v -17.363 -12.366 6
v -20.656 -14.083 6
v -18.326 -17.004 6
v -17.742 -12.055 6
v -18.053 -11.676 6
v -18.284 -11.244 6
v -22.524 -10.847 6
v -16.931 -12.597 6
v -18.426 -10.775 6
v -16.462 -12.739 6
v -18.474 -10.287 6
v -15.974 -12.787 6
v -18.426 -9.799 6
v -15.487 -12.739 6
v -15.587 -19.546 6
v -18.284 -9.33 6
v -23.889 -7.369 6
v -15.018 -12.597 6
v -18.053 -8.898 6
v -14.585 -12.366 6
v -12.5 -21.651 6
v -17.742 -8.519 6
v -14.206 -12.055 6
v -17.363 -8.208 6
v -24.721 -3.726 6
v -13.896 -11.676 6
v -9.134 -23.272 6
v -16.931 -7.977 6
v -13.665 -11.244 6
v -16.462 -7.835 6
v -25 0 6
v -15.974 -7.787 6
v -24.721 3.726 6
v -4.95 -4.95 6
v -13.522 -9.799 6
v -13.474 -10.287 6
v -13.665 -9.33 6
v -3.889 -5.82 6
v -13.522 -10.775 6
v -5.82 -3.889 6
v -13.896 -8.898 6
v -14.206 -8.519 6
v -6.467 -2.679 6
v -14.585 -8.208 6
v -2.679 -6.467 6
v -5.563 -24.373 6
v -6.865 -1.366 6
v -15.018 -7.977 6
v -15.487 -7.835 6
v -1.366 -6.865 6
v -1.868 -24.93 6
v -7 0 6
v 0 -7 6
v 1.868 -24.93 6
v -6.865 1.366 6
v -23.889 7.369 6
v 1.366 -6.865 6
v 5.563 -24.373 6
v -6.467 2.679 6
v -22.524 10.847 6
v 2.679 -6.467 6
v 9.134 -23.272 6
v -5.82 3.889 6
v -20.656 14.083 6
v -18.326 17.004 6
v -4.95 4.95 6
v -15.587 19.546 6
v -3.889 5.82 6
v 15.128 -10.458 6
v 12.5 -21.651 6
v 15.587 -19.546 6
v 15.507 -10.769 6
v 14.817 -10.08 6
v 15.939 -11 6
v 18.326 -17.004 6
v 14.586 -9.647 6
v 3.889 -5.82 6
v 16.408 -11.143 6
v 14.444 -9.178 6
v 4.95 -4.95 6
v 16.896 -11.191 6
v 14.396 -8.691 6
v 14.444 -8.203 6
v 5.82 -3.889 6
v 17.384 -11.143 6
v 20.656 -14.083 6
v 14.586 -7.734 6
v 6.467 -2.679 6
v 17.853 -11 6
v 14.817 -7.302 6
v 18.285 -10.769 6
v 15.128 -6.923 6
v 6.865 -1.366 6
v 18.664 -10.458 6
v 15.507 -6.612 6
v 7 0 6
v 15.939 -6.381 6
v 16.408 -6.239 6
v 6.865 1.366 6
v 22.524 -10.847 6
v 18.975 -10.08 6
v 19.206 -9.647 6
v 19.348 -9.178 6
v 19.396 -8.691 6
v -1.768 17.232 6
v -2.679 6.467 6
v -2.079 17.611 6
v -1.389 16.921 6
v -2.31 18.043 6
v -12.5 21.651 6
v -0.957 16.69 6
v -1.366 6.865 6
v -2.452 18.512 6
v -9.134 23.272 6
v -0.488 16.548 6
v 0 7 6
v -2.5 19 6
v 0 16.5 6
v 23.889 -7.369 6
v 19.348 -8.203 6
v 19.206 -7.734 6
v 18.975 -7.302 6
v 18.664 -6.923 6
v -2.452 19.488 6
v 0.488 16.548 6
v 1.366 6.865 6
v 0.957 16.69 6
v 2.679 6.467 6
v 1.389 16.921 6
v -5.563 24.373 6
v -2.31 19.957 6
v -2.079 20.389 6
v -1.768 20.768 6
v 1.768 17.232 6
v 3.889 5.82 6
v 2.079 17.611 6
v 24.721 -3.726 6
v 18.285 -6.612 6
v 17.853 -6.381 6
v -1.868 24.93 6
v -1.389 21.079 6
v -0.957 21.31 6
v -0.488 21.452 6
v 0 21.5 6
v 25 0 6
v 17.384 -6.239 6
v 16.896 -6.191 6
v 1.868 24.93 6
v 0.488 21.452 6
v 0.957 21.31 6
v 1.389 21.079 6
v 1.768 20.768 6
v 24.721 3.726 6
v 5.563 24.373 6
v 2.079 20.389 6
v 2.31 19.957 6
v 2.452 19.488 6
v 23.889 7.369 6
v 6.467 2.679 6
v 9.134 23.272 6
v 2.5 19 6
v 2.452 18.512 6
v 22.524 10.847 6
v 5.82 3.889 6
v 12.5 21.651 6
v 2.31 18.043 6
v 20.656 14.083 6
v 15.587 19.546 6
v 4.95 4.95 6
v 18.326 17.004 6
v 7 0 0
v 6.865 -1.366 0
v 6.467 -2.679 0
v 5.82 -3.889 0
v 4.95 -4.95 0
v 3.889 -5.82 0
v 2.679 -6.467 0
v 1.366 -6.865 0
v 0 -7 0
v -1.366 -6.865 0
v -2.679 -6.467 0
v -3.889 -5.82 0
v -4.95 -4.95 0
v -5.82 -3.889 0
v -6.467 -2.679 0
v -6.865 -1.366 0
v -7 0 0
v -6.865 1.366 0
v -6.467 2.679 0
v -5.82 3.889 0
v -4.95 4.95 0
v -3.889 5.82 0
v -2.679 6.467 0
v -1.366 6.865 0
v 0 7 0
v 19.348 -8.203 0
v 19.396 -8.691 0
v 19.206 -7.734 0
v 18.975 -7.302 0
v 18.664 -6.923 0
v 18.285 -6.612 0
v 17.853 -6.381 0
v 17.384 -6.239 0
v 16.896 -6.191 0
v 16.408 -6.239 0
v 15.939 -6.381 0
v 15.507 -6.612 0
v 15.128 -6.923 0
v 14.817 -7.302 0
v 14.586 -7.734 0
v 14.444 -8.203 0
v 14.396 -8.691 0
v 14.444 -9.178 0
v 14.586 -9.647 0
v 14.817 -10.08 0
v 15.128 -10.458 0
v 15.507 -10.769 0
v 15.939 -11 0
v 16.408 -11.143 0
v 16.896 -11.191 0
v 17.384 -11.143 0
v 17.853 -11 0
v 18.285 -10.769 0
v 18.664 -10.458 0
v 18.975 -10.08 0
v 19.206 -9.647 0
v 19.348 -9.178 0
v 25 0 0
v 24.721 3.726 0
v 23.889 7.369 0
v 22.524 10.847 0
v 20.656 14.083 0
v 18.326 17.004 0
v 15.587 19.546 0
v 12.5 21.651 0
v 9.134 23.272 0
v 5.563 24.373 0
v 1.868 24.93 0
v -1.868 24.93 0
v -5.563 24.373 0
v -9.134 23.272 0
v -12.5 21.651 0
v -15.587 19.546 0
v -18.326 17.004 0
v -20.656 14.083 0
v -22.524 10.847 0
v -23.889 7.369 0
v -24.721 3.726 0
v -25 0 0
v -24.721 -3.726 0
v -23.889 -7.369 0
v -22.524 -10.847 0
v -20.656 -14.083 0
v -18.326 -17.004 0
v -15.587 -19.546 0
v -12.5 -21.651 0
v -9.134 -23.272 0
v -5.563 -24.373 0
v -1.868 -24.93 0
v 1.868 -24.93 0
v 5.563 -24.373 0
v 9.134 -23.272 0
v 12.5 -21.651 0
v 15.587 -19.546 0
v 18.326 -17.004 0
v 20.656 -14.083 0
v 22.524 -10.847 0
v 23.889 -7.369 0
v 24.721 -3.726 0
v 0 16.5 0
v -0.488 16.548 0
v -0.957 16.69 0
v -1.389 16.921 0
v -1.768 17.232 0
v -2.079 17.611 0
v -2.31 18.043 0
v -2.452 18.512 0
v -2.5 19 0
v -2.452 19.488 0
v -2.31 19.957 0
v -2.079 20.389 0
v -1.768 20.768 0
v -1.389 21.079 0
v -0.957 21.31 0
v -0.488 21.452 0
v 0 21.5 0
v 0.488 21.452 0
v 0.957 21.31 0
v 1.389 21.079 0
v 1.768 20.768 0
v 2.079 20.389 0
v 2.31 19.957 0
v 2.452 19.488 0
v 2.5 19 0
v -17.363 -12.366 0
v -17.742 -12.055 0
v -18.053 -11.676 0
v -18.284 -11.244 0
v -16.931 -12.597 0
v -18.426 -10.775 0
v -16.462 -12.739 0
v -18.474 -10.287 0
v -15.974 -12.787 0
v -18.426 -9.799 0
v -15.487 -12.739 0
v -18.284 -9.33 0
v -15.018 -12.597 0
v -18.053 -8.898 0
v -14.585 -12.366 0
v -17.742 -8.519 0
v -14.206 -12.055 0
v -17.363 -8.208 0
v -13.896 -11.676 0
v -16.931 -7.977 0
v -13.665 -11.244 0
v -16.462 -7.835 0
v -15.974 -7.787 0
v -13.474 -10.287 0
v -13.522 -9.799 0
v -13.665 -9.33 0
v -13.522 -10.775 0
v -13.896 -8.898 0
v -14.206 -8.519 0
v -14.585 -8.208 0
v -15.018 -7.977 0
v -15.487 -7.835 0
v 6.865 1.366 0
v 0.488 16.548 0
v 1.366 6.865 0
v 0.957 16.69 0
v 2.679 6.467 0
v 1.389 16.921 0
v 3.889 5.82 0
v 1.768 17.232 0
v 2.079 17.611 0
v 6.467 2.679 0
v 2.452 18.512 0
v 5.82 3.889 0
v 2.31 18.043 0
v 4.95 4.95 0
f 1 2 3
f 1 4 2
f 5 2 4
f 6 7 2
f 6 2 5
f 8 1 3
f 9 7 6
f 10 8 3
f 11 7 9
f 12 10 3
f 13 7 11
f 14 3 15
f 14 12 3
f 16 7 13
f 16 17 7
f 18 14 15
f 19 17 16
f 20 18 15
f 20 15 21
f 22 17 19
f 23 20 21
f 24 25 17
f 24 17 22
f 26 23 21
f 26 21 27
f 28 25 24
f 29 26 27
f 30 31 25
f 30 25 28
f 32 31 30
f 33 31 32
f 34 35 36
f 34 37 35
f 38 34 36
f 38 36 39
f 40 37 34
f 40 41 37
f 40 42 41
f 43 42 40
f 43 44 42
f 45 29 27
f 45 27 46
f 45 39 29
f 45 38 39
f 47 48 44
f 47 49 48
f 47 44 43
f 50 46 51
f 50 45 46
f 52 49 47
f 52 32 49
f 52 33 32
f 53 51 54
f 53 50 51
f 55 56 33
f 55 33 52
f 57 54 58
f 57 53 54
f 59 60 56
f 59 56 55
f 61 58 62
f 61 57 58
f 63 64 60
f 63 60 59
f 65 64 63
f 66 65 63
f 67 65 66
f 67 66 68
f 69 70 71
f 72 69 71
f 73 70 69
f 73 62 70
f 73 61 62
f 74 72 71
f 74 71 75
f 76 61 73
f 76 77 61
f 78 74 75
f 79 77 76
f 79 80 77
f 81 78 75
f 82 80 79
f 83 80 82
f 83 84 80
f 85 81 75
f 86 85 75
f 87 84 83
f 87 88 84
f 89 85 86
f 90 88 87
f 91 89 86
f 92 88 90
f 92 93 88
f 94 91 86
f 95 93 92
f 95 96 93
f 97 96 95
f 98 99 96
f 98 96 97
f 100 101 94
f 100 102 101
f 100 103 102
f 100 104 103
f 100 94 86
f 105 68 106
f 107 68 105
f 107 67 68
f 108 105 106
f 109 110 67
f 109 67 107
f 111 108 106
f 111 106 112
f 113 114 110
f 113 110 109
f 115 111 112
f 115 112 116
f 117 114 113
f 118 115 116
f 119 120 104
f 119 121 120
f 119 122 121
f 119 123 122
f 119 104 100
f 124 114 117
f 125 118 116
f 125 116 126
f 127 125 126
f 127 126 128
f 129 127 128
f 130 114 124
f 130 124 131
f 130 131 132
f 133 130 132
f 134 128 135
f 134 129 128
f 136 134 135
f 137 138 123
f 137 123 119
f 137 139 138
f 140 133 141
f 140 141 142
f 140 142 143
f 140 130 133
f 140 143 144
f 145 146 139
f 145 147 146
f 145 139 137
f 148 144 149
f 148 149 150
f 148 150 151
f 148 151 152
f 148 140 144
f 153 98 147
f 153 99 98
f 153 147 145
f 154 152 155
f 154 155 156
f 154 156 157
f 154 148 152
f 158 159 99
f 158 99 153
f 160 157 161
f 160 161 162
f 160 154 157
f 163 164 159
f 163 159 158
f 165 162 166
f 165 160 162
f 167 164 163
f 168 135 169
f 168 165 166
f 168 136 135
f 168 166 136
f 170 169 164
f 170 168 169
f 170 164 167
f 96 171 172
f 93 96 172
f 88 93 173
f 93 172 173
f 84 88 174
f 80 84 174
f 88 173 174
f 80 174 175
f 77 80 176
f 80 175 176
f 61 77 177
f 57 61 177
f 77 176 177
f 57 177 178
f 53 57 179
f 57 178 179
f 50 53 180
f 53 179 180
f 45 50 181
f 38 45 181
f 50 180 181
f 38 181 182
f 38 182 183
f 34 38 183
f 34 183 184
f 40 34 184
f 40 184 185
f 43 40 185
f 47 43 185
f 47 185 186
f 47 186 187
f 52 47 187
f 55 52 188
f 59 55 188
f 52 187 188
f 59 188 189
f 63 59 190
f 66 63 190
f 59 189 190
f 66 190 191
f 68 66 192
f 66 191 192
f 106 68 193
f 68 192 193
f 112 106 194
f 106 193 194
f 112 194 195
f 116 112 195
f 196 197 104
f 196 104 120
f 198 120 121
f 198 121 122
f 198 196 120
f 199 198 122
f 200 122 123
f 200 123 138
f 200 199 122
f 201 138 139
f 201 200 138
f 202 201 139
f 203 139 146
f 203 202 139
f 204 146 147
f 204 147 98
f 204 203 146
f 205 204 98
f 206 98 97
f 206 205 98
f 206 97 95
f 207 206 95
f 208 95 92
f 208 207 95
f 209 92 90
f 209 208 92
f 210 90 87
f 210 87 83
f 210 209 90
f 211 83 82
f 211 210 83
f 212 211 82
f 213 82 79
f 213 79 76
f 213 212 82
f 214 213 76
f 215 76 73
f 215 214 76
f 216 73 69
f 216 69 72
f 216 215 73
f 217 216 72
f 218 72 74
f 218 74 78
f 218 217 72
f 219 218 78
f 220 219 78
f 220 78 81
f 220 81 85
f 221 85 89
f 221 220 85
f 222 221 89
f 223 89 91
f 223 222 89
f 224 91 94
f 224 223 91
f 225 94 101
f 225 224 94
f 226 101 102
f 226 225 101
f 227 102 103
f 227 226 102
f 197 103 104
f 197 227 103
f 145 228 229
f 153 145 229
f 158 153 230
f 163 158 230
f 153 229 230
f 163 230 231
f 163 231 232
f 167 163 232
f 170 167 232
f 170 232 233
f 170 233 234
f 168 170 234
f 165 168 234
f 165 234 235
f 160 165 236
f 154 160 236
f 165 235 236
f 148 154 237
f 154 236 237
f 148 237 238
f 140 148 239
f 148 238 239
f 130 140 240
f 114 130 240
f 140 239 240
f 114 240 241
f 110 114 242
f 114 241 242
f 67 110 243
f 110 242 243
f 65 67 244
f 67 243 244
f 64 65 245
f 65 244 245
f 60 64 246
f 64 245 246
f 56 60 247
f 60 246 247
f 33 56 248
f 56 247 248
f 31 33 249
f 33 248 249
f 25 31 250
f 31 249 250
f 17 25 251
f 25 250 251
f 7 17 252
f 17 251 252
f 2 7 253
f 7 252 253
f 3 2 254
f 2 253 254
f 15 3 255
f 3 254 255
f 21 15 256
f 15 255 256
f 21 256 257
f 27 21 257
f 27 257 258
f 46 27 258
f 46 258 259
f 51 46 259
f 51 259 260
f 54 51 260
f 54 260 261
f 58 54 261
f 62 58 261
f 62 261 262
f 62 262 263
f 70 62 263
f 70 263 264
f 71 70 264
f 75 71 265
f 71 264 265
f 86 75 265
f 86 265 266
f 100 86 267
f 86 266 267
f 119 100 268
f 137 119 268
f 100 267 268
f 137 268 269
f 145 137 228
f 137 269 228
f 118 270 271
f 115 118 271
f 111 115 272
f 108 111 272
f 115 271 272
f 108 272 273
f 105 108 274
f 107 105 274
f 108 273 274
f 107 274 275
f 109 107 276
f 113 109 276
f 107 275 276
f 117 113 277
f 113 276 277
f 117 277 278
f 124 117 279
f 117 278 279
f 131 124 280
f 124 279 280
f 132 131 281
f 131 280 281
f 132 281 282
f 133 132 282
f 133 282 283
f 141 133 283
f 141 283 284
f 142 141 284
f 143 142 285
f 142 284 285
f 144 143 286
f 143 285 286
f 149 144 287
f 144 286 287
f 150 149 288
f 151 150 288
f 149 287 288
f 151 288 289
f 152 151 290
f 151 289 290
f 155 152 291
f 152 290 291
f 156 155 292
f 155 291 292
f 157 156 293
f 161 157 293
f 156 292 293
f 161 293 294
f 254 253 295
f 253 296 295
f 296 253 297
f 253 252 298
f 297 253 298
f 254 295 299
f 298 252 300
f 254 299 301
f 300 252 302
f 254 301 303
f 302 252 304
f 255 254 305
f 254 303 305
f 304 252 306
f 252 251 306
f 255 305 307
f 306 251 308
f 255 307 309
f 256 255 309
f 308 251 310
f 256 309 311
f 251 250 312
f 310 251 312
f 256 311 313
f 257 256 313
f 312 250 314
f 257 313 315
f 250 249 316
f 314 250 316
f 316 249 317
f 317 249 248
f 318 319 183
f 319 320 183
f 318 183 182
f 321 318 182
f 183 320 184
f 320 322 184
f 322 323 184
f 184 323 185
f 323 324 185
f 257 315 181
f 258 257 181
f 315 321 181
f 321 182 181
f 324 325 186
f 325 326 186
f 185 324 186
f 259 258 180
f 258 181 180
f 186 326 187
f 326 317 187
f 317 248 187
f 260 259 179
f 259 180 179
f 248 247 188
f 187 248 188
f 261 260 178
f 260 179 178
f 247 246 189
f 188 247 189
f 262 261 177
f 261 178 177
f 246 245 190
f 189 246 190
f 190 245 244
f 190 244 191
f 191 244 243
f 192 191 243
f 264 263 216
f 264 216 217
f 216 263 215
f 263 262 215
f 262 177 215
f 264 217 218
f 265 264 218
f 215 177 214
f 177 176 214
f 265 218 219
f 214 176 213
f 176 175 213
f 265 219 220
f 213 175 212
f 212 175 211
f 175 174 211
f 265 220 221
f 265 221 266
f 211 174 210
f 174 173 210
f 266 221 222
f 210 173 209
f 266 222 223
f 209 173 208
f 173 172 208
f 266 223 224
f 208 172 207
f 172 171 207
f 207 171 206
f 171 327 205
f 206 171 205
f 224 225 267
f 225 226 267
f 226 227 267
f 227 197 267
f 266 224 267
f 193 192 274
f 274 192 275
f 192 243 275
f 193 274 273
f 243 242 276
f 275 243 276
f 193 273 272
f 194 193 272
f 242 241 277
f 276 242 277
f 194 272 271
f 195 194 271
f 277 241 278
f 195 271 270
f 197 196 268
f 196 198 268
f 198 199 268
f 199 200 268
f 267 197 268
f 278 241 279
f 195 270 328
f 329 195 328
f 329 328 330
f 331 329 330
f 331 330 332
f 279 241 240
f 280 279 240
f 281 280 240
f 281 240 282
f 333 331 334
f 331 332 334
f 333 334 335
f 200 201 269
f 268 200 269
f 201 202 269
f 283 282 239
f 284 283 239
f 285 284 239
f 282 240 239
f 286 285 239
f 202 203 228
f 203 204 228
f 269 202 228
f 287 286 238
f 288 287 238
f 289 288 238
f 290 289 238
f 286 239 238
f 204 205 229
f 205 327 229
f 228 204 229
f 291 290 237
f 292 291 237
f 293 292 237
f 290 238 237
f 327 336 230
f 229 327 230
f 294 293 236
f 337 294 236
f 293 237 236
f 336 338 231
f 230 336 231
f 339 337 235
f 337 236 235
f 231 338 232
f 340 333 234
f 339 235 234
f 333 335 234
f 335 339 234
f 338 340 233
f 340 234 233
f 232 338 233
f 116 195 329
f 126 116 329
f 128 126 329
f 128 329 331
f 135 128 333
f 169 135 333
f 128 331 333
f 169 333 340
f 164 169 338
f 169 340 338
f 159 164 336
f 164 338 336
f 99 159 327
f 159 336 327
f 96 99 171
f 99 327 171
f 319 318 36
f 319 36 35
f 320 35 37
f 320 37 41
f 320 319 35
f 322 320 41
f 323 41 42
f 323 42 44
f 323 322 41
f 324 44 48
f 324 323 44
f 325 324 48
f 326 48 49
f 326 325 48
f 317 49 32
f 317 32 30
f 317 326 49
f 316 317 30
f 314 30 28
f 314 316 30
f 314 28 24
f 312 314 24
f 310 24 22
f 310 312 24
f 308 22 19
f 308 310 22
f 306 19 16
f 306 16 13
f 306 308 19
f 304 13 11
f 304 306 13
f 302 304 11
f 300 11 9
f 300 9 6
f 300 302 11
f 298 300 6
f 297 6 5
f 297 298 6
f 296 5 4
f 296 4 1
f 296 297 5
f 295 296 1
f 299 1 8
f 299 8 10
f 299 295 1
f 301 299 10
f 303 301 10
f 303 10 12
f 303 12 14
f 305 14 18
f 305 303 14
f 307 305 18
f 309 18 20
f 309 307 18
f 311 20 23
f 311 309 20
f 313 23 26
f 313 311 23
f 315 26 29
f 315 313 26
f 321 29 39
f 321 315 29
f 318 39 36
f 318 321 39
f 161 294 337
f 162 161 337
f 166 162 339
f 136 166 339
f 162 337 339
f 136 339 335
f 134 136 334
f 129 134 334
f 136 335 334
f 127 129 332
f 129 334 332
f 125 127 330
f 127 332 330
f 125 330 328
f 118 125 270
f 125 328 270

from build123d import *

# Parameters (mm, degrees)
F0_R     = 25
F0_R_2   = 2.5
F1_DEPTH = 6


with BuildPart() as f1:
    # F0 (on Top) → F1 (new body)
    with BuildSketch(Plane.XY):
        Circle(F0_R)
        with Locations((-15.974261, -10.287031)):
            Circle(F0_R_2, mode=Mode.SUBTRACT)
        with Locations((16.89596, -8.6906)):
            Circle(F0_R_2, mode=Mode.SUBTRACT)
        with BuildLine():
            ThreePointArc((0, 7), (4.949747, 4.949747), (7, 0))
            ThreePointArc((7, 0), (-4.949747, -4.949747), (0, 7))
        make_face(mode=Mode.SUBTRACT)
        with BuildLine():
            ThreePointArc((2.5, 19), (1.767767, 17.232233), (0, 16.5))
            ThreePointArc((0, 16.5), (-1.767767, 20.767767), (2.5, 19))
        make_face(mode=Mode.SUBTRACT)
    extrude(amount=F1_DEPTH)


solid = f1.part
